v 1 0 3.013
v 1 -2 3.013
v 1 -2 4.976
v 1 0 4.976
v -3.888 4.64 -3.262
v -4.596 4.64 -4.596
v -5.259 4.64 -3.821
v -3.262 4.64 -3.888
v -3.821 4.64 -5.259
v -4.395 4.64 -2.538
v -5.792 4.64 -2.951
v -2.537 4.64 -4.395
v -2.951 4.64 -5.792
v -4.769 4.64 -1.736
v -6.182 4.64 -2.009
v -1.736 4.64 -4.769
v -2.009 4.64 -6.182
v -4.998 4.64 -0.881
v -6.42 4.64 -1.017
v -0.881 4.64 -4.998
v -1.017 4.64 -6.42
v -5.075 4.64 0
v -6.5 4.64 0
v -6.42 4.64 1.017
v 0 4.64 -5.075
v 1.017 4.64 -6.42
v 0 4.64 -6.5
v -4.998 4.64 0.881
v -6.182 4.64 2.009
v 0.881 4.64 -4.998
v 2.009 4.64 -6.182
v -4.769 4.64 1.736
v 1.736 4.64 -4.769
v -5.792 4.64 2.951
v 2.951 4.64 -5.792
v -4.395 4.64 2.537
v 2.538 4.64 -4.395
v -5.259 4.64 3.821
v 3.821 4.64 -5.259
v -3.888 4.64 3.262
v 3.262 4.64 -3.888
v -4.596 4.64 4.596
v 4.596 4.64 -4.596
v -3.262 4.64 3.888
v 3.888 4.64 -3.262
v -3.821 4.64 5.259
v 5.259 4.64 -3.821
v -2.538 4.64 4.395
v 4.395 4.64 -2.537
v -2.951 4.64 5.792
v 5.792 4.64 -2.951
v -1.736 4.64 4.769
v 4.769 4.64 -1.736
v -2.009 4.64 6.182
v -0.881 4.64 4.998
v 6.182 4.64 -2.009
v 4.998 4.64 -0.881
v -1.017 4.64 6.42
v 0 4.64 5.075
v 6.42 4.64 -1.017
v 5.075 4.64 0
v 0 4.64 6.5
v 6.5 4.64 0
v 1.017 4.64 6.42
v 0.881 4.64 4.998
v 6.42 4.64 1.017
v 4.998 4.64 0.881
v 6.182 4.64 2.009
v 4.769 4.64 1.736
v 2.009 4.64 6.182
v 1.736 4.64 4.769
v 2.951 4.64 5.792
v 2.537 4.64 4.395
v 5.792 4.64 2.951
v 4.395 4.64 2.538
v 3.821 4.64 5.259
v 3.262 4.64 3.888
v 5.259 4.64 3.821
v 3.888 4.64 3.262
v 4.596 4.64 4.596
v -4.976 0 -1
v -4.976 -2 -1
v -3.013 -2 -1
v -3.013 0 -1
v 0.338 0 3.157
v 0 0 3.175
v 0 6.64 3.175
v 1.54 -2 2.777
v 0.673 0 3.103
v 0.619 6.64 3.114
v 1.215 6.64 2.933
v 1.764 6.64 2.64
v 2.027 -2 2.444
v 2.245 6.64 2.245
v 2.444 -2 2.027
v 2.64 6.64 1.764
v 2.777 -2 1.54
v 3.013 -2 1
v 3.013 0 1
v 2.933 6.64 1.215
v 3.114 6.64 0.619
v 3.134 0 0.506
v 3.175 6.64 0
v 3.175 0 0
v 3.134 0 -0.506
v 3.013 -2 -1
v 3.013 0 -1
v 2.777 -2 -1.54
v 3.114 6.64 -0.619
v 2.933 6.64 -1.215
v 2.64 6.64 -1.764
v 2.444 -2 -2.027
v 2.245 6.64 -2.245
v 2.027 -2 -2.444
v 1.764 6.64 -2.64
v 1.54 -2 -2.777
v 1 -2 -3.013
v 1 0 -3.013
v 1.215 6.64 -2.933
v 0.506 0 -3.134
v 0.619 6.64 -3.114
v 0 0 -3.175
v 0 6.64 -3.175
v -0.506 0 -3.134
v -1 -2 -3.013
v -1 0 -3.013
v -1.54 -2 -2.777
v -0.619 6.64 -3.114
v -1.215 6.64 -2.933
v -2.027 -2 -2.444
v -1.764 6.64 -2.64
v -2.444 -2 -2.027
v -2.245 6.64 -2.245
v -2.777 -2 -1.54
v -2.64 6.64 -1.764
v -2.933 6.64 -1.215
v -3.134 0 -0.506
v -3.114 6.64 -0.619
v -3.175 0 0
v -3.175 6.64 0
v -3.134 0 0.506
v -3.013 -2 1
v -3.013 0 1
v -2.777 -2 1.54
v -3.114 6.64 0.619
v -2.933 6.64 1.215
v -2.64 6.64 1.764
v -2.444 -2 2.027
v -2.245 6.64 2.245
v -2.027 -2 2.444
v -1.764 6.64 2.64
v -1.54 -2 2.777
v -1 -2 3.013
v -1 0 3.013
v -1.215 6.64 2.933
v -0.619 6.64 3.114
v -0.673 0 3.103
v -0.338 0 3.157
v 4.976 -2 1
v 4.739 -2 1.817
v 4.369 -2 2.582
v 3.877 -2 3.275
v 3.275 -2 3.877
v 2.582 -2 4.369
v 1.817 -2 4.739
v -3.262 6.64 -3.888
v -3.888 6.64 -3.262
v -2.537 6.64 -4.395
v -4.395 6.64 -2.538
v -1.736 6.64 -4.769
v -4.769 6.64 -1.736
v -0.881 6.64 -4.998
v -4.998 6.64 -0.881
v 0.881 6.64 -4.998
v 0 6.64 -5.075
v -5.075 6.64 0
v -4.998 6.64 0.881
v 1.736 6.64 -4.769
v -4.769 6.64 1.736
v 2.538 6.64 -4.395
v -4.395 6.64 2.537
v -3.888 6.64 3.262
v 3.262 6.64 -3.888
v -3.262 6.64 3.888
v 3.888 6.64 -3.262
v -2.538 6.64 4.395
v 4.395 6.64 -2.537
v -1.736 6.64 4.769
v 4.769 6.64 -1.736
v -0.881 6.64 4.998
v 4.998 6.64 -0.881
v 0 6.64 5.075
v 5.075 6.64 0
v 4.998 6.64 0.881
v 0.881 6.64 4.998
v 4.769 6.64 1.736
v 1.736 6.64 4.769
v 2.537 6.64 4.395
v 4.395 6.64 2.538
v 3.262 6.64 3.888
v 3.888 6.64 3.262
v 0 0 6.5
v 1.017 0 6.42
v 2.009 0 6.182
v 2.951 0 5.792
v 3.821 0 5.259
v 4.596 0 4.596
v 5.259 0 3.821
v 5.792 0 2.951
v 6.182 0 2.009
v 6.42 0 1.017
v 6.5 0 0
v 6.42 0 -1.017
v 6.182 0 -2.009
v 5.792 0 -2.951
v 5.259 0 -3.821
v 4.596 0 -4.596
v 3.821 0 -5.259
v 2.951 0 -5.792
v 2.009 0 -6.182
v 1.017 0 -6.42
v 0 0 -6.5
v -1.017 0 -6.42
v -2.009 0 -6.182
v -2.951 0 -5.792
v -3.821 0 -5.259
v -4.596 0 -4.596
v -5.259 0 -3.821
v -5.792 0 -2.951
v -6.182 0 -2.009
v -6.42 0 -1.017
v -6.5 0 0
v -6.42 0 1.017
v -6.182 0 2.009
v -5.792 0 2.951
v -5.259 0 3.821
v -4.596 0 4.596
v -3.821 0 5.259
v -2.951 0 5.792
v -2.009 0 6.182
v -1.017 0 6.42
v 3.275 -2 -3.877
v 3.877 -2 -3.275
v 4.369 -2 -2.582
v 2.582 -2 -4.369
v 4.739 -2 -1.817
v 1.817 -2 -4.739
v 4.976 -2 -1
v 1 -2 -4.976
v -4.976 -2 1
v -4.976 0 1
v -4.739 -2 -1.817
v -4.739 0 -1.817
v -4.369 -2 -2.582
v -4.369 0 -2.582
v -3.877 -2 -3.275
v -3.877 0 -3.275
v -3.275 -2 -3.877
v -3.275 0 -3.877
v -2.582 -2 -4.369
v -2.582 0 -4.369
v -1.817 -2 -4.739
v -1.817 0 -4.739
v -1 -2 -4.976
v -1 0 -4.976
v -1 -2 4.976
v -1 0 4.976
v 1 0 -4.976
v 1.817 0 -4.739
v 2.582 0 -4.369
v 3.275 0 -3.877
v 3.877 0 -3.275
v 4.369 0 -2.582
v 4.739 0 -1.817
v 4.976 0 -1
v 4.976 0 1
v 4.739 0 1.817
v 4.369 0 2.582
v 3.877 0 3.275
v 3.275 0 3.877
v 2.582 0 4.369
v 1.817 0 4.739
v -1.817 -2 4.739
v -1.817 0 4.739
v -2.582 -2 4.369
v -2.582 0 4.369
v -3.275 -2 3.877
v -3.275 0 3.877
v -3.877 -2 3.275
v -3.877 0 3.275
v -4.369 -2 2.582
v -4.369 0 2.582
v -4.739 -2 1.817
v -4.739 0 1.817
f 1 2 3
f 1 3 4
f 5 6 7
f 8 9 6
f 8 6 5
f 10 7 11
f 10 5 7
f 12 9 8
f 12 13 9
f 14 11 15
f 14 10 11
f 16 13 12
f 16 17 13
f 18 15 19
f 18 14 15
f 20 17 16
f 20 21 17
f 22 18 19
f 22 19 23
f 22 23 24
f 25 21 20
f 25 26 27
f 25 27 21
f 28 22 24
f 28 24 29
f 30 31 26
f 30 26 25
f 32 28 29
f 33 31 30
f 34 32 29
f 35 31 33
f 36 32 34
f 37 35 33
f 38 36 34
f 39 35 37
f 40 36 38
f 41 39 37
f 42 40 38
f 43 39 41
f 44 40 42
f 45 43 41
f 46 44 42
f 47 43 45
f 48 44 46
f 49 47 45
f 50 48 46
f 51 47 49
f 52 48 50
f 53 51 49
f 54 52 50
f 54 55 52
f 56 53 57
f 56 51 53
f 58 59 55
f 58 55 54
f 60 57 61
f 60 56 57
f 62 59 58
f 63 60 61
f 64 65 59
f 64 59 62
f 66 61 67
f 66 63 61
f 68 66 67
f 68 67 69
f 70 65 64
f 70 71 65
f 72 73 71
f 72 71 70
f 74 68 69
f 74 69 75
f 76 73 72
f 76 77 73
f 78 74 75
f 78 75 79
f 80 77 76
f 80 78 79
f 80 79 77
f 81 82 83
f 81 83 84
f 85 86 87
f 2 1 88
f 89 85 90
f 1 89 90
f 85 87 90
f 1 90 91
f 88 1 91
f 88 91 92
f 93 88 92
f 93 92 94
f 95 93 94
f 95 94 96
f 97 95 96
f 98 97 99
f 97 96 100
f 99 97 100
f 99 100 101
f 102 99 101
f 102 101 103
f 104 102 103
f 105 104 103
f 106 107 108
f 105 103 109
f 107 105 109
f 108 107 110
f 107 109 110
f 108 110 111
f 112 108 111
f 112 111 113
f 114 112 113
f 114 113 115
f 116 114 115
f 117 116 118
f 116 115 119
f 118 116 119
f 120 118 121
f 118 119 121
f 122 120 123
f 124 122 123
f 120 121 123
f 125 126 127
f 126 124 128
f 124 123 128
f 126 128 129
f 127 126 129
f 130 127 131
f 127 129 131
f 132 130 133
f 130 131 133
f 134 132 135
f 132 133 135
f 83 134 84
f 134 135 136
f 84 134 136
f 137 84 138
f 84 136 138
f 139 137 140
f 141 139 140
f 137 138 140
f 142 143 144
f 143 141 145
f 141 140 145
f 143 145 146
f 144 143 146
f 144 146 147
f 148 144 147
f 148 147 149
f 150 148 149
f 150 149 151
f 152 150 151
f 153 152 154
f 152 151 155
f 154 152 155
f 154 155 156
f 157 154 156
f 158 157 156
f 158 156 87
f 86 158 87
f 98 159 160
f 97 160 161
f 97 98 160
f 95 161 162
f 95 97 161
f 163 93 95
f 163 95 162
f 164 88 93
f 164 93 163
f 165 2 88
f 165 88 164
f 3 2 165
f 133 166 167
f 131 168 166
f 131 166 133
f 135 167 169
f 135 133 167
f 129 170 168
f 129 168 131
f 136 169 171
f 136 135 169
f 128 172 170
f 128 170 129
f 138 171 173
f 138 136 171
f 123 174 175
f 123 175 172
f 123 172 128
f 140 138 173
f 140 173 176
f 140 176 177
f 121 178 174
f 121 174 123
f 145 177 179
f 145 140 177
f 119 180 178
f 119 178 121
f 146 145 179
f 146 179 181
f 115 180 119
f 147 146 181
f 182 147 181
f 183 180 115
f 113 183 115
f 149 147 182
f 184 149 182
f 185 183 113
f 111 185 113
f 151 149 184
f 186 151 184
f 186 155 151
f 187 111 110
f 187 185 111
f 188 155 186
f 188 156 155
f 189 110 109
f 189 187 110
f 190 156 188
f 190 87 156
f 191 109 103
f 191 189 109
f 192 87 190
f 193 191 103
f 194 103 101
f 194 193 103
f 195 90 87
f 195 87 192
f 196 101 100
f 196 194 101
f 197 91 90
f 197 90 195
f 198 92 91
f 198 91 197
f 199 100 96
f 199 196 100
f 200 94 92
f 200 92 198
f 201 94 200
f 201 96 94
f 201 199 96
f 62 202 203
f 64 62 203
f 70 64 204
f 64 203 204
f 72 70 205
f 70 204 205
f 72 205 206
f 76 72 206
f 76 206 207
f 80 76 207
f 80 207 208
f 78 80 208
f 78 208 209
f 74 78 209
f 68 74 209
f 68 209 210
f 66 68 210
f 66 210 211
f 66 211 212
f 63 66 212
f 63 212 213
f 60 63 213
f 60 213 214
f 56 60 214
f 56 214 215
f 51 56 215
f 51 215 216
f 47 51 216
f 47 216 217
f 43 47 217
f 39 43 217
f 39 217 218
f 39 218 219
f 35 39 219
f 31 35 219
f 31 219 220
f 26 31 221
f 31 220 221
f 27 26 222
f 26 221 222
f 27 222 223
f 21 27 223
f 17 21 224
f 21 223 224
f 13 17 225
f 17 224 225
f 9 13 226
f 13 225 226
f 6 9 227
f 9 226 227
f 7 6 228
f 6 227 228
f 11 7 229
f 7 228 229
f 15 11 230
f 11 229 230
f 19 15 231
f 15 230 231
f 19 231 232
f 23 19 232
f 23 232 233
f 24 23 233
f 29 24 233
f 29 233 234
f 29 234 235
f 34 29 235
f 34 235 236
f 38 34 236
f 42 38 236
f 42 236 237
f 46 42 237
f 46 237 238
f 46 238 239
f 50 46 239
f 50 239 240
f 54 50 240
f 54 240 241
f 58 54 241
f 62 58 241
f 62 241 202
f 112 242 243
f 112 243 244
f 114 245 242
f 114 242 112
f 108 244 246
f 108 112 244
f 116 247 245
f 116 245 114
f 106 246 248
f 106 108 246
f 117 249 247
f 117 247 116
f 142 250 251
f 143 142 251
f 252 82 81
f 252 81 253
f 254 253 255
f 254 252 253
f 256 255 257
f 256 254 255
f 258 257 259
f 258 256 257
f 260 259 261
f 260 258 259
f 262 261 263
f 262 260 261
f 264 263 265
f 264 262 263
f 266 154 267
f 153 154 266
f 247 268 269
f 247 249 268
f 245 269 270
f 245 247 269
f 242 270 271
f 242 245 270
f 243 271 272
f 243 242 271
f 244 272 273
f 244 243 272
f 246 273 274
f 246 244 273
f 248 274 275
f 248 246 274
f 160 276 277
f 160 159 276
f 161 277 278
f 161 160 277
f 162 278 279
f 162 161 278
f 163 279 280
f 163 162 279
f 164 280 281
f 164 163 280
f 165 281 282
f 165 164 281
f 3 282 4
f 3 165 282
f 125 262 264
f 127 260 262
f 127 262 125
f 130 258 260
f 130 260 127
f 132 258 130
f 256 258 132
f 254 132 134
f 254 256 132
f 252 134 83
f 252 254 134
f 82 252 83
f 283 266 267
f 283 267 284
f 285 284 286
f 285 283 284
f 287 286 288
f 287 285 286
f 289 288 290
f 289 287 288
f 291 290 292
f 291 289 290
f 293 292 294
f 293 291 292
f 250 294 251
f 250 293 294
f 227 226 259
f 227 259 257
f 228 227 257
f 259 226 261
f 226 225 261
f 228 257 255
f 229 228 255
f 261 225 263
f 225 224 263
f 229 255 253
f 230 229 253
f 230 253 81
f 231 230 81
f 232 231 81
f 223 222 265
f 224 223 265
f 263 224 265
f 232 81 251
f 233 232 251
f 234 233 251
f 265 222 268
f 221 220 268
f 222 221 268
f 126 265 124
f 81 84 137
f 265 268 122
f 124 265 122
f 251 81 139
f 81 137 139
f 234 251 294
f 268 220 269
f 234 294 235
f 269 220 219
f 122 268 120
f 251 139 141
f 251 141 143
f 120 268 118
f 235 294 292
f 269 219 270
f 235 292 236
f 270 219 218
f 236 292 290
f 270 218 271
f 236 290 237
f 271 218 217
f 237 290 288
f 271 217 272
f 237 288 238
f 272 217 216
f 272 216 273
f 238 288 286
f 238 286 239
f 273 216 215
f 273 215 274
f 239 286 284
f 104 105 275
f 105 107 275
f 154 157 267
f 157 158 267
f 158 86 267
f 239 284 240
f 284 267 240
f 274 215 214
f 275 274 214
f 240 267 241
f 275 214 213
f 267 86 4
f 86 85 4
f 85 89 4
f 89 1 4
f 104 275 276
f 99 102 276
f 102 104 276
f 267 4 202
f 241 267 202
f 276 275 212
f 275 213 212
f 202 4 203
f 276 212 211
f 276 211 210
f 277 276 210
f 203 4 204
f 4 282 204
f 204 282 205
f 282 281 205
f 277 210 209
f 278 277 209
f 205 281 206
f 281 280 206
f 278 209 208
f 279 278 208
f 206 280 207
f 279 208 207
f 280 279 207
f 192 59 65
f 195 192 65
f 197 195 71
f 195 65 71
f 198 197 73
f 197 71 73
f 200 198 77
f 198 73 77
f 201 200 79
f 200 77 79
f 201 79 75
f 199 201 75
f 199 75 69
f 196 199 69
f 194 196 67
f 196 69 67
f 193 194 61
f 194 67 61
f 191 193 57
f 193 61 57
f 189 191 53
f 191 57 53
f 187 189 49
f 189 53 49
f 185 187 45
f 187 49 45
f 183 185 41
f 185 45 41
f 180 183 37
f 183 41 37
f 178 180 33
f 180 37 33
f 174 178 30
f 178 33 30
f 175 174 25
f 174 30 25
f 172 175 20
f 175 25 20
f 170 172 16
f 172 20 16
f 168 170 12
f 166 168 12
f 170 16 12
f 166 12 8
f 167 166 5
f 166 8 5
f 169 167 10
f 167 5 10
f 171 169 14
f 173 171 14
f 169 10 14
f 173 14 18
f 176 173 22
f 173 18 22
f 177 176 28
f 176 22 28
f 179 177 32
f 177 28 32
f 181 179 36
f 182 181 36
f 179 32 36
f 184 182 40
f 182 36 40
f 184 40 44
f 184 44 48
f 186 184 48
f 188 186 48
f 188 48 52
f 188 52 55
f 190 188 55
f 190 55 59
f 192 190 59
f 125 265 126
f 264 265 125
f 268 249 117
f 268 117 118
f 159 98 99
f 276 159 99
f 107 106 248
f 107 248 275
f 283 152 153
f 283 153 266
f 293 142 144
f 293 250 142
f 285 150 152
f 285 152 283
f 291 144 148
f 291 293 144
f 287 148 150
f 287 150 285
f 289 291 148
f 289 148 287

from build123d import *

# Parameters (mm, degrees)
SKETCH1_R               = 6.5
BOSS_EXTRUDE1_DEPTH     = 4.64
SKETCH2_R               = 5.075
BOSS_EXTRUDE2_DEPTH     = 2
BOSS_EXTRUDE3_START     = 2
SKETCH3_R               = 5.075
BOSS_EXTRUDE3_DEPTH     = 2
SKETCH4_R               = 3.175
CUT_EXTRUDE1_DEPTH      = 13.615450844
CUT_EXTRUDE2_DEPTH      = 12.339735447
CUT_EXTRUDE2_DEPTH_BACK = 12.339735447
CUT_EXTRUDE3_DEPTH      = 12.339735447
CUT_EXTRUDE3_DEPTH_BACK = 12.339735447
SKETCH6_W               = 1
SKETCH6_H               = 2


with BuildPart() as part:
    # Sketch1 → Boss-Extrude1 (new body)
    with BuildSketch(Plane(origin=(0, 0, 0), x_dir=(1, 0, 0), z_dir=(0, 1, 0))):
        with Locations(Location((0, 0, 0), (0, 0, 270))):
            Circle(SKETCH1_R)
    extrude(amount=BOSS_EXTRUDE1_DEPTH)

    # Sketch2 → Boss-Extrude2 (add)
    with BuildSketch(Plane(origin=(0, 4.64, 0), x_dir=(1, 0, 0), z_dir=(0, 1, 0))):
        with Locations(Location((0, 0, 0), (0, 0, 270))):
            Circle(SKETCH2_R)
    extrude(amount=BOSS_EXTRUDE2_DEPTH)

    # Sketch3 → Boss-Extrude3 (add)
    with BuildSketch(Plane.XZ.offset(BOSS_EXTRUDE3_START)):
        with Locations(Location((0, 0, 0), (0, 0, 90))):
            Circle(SKETCH3_R)
    extrude(amount=-BOSS_EXTRUDE3_DEPTH)

    # Sketch4 → Cut-Extrude1 (cut, through all)
    with BuildSketch(Plane(origin=(0, 6.64, 0), x_dir=(1, 0, 0), z_dir=(0, 1, 0))):
        with Locations(Location((0, 0, 0), (0, 0, 270))):
            Circle(SKETCH4_R)
    extrude(amount=-CUT_EXTRUDE1_DEPTH, mode=Mode.SUBTRACT)

    # Sketch5 → Cut-Extrude2 (cut, two sides: drawn at the far end of the back side and taken through both)
    with BuildSketch(Plane.XY.offset(-CUT_EXTRUDE2_DEPTH_BACK)):
        Polygon((0, 0), (-1, 0), (-1, -2), (1, -2), (1, 0), align=None)
    extrude(amount=CUT_EXTRUDE2_DEPTH + CUT_EXTRUDE2_DEPTH_BACK, mode=Mode.SUBTRACT)

    # Sketch6 → Cut-Extrude3 (cut, two sides: drawn at the far end of the back side and taken through both)
    with BuildSketch(Plane(origin=(0, 0, 0), x_dir=(0, 0, -1), z_dir=(1, 0, 0)).offset(-CUT_EXTRUDE3_DEPTH_BACK)):
        with Locations((0.5, -1)):
            Rectangle(SKETCH6_W, SKETCH6_H)
        with Locations((-0.5, -1)):
            Rectangle(SKETCH6_W, SKETCH6_H)
    extrude(amount=CUT_EXTRUDE3_DEPTH + CUT_EXTRUDE3_DEPTH_BACK, mode=Mode.SUBTRACT)


solid = part.part
